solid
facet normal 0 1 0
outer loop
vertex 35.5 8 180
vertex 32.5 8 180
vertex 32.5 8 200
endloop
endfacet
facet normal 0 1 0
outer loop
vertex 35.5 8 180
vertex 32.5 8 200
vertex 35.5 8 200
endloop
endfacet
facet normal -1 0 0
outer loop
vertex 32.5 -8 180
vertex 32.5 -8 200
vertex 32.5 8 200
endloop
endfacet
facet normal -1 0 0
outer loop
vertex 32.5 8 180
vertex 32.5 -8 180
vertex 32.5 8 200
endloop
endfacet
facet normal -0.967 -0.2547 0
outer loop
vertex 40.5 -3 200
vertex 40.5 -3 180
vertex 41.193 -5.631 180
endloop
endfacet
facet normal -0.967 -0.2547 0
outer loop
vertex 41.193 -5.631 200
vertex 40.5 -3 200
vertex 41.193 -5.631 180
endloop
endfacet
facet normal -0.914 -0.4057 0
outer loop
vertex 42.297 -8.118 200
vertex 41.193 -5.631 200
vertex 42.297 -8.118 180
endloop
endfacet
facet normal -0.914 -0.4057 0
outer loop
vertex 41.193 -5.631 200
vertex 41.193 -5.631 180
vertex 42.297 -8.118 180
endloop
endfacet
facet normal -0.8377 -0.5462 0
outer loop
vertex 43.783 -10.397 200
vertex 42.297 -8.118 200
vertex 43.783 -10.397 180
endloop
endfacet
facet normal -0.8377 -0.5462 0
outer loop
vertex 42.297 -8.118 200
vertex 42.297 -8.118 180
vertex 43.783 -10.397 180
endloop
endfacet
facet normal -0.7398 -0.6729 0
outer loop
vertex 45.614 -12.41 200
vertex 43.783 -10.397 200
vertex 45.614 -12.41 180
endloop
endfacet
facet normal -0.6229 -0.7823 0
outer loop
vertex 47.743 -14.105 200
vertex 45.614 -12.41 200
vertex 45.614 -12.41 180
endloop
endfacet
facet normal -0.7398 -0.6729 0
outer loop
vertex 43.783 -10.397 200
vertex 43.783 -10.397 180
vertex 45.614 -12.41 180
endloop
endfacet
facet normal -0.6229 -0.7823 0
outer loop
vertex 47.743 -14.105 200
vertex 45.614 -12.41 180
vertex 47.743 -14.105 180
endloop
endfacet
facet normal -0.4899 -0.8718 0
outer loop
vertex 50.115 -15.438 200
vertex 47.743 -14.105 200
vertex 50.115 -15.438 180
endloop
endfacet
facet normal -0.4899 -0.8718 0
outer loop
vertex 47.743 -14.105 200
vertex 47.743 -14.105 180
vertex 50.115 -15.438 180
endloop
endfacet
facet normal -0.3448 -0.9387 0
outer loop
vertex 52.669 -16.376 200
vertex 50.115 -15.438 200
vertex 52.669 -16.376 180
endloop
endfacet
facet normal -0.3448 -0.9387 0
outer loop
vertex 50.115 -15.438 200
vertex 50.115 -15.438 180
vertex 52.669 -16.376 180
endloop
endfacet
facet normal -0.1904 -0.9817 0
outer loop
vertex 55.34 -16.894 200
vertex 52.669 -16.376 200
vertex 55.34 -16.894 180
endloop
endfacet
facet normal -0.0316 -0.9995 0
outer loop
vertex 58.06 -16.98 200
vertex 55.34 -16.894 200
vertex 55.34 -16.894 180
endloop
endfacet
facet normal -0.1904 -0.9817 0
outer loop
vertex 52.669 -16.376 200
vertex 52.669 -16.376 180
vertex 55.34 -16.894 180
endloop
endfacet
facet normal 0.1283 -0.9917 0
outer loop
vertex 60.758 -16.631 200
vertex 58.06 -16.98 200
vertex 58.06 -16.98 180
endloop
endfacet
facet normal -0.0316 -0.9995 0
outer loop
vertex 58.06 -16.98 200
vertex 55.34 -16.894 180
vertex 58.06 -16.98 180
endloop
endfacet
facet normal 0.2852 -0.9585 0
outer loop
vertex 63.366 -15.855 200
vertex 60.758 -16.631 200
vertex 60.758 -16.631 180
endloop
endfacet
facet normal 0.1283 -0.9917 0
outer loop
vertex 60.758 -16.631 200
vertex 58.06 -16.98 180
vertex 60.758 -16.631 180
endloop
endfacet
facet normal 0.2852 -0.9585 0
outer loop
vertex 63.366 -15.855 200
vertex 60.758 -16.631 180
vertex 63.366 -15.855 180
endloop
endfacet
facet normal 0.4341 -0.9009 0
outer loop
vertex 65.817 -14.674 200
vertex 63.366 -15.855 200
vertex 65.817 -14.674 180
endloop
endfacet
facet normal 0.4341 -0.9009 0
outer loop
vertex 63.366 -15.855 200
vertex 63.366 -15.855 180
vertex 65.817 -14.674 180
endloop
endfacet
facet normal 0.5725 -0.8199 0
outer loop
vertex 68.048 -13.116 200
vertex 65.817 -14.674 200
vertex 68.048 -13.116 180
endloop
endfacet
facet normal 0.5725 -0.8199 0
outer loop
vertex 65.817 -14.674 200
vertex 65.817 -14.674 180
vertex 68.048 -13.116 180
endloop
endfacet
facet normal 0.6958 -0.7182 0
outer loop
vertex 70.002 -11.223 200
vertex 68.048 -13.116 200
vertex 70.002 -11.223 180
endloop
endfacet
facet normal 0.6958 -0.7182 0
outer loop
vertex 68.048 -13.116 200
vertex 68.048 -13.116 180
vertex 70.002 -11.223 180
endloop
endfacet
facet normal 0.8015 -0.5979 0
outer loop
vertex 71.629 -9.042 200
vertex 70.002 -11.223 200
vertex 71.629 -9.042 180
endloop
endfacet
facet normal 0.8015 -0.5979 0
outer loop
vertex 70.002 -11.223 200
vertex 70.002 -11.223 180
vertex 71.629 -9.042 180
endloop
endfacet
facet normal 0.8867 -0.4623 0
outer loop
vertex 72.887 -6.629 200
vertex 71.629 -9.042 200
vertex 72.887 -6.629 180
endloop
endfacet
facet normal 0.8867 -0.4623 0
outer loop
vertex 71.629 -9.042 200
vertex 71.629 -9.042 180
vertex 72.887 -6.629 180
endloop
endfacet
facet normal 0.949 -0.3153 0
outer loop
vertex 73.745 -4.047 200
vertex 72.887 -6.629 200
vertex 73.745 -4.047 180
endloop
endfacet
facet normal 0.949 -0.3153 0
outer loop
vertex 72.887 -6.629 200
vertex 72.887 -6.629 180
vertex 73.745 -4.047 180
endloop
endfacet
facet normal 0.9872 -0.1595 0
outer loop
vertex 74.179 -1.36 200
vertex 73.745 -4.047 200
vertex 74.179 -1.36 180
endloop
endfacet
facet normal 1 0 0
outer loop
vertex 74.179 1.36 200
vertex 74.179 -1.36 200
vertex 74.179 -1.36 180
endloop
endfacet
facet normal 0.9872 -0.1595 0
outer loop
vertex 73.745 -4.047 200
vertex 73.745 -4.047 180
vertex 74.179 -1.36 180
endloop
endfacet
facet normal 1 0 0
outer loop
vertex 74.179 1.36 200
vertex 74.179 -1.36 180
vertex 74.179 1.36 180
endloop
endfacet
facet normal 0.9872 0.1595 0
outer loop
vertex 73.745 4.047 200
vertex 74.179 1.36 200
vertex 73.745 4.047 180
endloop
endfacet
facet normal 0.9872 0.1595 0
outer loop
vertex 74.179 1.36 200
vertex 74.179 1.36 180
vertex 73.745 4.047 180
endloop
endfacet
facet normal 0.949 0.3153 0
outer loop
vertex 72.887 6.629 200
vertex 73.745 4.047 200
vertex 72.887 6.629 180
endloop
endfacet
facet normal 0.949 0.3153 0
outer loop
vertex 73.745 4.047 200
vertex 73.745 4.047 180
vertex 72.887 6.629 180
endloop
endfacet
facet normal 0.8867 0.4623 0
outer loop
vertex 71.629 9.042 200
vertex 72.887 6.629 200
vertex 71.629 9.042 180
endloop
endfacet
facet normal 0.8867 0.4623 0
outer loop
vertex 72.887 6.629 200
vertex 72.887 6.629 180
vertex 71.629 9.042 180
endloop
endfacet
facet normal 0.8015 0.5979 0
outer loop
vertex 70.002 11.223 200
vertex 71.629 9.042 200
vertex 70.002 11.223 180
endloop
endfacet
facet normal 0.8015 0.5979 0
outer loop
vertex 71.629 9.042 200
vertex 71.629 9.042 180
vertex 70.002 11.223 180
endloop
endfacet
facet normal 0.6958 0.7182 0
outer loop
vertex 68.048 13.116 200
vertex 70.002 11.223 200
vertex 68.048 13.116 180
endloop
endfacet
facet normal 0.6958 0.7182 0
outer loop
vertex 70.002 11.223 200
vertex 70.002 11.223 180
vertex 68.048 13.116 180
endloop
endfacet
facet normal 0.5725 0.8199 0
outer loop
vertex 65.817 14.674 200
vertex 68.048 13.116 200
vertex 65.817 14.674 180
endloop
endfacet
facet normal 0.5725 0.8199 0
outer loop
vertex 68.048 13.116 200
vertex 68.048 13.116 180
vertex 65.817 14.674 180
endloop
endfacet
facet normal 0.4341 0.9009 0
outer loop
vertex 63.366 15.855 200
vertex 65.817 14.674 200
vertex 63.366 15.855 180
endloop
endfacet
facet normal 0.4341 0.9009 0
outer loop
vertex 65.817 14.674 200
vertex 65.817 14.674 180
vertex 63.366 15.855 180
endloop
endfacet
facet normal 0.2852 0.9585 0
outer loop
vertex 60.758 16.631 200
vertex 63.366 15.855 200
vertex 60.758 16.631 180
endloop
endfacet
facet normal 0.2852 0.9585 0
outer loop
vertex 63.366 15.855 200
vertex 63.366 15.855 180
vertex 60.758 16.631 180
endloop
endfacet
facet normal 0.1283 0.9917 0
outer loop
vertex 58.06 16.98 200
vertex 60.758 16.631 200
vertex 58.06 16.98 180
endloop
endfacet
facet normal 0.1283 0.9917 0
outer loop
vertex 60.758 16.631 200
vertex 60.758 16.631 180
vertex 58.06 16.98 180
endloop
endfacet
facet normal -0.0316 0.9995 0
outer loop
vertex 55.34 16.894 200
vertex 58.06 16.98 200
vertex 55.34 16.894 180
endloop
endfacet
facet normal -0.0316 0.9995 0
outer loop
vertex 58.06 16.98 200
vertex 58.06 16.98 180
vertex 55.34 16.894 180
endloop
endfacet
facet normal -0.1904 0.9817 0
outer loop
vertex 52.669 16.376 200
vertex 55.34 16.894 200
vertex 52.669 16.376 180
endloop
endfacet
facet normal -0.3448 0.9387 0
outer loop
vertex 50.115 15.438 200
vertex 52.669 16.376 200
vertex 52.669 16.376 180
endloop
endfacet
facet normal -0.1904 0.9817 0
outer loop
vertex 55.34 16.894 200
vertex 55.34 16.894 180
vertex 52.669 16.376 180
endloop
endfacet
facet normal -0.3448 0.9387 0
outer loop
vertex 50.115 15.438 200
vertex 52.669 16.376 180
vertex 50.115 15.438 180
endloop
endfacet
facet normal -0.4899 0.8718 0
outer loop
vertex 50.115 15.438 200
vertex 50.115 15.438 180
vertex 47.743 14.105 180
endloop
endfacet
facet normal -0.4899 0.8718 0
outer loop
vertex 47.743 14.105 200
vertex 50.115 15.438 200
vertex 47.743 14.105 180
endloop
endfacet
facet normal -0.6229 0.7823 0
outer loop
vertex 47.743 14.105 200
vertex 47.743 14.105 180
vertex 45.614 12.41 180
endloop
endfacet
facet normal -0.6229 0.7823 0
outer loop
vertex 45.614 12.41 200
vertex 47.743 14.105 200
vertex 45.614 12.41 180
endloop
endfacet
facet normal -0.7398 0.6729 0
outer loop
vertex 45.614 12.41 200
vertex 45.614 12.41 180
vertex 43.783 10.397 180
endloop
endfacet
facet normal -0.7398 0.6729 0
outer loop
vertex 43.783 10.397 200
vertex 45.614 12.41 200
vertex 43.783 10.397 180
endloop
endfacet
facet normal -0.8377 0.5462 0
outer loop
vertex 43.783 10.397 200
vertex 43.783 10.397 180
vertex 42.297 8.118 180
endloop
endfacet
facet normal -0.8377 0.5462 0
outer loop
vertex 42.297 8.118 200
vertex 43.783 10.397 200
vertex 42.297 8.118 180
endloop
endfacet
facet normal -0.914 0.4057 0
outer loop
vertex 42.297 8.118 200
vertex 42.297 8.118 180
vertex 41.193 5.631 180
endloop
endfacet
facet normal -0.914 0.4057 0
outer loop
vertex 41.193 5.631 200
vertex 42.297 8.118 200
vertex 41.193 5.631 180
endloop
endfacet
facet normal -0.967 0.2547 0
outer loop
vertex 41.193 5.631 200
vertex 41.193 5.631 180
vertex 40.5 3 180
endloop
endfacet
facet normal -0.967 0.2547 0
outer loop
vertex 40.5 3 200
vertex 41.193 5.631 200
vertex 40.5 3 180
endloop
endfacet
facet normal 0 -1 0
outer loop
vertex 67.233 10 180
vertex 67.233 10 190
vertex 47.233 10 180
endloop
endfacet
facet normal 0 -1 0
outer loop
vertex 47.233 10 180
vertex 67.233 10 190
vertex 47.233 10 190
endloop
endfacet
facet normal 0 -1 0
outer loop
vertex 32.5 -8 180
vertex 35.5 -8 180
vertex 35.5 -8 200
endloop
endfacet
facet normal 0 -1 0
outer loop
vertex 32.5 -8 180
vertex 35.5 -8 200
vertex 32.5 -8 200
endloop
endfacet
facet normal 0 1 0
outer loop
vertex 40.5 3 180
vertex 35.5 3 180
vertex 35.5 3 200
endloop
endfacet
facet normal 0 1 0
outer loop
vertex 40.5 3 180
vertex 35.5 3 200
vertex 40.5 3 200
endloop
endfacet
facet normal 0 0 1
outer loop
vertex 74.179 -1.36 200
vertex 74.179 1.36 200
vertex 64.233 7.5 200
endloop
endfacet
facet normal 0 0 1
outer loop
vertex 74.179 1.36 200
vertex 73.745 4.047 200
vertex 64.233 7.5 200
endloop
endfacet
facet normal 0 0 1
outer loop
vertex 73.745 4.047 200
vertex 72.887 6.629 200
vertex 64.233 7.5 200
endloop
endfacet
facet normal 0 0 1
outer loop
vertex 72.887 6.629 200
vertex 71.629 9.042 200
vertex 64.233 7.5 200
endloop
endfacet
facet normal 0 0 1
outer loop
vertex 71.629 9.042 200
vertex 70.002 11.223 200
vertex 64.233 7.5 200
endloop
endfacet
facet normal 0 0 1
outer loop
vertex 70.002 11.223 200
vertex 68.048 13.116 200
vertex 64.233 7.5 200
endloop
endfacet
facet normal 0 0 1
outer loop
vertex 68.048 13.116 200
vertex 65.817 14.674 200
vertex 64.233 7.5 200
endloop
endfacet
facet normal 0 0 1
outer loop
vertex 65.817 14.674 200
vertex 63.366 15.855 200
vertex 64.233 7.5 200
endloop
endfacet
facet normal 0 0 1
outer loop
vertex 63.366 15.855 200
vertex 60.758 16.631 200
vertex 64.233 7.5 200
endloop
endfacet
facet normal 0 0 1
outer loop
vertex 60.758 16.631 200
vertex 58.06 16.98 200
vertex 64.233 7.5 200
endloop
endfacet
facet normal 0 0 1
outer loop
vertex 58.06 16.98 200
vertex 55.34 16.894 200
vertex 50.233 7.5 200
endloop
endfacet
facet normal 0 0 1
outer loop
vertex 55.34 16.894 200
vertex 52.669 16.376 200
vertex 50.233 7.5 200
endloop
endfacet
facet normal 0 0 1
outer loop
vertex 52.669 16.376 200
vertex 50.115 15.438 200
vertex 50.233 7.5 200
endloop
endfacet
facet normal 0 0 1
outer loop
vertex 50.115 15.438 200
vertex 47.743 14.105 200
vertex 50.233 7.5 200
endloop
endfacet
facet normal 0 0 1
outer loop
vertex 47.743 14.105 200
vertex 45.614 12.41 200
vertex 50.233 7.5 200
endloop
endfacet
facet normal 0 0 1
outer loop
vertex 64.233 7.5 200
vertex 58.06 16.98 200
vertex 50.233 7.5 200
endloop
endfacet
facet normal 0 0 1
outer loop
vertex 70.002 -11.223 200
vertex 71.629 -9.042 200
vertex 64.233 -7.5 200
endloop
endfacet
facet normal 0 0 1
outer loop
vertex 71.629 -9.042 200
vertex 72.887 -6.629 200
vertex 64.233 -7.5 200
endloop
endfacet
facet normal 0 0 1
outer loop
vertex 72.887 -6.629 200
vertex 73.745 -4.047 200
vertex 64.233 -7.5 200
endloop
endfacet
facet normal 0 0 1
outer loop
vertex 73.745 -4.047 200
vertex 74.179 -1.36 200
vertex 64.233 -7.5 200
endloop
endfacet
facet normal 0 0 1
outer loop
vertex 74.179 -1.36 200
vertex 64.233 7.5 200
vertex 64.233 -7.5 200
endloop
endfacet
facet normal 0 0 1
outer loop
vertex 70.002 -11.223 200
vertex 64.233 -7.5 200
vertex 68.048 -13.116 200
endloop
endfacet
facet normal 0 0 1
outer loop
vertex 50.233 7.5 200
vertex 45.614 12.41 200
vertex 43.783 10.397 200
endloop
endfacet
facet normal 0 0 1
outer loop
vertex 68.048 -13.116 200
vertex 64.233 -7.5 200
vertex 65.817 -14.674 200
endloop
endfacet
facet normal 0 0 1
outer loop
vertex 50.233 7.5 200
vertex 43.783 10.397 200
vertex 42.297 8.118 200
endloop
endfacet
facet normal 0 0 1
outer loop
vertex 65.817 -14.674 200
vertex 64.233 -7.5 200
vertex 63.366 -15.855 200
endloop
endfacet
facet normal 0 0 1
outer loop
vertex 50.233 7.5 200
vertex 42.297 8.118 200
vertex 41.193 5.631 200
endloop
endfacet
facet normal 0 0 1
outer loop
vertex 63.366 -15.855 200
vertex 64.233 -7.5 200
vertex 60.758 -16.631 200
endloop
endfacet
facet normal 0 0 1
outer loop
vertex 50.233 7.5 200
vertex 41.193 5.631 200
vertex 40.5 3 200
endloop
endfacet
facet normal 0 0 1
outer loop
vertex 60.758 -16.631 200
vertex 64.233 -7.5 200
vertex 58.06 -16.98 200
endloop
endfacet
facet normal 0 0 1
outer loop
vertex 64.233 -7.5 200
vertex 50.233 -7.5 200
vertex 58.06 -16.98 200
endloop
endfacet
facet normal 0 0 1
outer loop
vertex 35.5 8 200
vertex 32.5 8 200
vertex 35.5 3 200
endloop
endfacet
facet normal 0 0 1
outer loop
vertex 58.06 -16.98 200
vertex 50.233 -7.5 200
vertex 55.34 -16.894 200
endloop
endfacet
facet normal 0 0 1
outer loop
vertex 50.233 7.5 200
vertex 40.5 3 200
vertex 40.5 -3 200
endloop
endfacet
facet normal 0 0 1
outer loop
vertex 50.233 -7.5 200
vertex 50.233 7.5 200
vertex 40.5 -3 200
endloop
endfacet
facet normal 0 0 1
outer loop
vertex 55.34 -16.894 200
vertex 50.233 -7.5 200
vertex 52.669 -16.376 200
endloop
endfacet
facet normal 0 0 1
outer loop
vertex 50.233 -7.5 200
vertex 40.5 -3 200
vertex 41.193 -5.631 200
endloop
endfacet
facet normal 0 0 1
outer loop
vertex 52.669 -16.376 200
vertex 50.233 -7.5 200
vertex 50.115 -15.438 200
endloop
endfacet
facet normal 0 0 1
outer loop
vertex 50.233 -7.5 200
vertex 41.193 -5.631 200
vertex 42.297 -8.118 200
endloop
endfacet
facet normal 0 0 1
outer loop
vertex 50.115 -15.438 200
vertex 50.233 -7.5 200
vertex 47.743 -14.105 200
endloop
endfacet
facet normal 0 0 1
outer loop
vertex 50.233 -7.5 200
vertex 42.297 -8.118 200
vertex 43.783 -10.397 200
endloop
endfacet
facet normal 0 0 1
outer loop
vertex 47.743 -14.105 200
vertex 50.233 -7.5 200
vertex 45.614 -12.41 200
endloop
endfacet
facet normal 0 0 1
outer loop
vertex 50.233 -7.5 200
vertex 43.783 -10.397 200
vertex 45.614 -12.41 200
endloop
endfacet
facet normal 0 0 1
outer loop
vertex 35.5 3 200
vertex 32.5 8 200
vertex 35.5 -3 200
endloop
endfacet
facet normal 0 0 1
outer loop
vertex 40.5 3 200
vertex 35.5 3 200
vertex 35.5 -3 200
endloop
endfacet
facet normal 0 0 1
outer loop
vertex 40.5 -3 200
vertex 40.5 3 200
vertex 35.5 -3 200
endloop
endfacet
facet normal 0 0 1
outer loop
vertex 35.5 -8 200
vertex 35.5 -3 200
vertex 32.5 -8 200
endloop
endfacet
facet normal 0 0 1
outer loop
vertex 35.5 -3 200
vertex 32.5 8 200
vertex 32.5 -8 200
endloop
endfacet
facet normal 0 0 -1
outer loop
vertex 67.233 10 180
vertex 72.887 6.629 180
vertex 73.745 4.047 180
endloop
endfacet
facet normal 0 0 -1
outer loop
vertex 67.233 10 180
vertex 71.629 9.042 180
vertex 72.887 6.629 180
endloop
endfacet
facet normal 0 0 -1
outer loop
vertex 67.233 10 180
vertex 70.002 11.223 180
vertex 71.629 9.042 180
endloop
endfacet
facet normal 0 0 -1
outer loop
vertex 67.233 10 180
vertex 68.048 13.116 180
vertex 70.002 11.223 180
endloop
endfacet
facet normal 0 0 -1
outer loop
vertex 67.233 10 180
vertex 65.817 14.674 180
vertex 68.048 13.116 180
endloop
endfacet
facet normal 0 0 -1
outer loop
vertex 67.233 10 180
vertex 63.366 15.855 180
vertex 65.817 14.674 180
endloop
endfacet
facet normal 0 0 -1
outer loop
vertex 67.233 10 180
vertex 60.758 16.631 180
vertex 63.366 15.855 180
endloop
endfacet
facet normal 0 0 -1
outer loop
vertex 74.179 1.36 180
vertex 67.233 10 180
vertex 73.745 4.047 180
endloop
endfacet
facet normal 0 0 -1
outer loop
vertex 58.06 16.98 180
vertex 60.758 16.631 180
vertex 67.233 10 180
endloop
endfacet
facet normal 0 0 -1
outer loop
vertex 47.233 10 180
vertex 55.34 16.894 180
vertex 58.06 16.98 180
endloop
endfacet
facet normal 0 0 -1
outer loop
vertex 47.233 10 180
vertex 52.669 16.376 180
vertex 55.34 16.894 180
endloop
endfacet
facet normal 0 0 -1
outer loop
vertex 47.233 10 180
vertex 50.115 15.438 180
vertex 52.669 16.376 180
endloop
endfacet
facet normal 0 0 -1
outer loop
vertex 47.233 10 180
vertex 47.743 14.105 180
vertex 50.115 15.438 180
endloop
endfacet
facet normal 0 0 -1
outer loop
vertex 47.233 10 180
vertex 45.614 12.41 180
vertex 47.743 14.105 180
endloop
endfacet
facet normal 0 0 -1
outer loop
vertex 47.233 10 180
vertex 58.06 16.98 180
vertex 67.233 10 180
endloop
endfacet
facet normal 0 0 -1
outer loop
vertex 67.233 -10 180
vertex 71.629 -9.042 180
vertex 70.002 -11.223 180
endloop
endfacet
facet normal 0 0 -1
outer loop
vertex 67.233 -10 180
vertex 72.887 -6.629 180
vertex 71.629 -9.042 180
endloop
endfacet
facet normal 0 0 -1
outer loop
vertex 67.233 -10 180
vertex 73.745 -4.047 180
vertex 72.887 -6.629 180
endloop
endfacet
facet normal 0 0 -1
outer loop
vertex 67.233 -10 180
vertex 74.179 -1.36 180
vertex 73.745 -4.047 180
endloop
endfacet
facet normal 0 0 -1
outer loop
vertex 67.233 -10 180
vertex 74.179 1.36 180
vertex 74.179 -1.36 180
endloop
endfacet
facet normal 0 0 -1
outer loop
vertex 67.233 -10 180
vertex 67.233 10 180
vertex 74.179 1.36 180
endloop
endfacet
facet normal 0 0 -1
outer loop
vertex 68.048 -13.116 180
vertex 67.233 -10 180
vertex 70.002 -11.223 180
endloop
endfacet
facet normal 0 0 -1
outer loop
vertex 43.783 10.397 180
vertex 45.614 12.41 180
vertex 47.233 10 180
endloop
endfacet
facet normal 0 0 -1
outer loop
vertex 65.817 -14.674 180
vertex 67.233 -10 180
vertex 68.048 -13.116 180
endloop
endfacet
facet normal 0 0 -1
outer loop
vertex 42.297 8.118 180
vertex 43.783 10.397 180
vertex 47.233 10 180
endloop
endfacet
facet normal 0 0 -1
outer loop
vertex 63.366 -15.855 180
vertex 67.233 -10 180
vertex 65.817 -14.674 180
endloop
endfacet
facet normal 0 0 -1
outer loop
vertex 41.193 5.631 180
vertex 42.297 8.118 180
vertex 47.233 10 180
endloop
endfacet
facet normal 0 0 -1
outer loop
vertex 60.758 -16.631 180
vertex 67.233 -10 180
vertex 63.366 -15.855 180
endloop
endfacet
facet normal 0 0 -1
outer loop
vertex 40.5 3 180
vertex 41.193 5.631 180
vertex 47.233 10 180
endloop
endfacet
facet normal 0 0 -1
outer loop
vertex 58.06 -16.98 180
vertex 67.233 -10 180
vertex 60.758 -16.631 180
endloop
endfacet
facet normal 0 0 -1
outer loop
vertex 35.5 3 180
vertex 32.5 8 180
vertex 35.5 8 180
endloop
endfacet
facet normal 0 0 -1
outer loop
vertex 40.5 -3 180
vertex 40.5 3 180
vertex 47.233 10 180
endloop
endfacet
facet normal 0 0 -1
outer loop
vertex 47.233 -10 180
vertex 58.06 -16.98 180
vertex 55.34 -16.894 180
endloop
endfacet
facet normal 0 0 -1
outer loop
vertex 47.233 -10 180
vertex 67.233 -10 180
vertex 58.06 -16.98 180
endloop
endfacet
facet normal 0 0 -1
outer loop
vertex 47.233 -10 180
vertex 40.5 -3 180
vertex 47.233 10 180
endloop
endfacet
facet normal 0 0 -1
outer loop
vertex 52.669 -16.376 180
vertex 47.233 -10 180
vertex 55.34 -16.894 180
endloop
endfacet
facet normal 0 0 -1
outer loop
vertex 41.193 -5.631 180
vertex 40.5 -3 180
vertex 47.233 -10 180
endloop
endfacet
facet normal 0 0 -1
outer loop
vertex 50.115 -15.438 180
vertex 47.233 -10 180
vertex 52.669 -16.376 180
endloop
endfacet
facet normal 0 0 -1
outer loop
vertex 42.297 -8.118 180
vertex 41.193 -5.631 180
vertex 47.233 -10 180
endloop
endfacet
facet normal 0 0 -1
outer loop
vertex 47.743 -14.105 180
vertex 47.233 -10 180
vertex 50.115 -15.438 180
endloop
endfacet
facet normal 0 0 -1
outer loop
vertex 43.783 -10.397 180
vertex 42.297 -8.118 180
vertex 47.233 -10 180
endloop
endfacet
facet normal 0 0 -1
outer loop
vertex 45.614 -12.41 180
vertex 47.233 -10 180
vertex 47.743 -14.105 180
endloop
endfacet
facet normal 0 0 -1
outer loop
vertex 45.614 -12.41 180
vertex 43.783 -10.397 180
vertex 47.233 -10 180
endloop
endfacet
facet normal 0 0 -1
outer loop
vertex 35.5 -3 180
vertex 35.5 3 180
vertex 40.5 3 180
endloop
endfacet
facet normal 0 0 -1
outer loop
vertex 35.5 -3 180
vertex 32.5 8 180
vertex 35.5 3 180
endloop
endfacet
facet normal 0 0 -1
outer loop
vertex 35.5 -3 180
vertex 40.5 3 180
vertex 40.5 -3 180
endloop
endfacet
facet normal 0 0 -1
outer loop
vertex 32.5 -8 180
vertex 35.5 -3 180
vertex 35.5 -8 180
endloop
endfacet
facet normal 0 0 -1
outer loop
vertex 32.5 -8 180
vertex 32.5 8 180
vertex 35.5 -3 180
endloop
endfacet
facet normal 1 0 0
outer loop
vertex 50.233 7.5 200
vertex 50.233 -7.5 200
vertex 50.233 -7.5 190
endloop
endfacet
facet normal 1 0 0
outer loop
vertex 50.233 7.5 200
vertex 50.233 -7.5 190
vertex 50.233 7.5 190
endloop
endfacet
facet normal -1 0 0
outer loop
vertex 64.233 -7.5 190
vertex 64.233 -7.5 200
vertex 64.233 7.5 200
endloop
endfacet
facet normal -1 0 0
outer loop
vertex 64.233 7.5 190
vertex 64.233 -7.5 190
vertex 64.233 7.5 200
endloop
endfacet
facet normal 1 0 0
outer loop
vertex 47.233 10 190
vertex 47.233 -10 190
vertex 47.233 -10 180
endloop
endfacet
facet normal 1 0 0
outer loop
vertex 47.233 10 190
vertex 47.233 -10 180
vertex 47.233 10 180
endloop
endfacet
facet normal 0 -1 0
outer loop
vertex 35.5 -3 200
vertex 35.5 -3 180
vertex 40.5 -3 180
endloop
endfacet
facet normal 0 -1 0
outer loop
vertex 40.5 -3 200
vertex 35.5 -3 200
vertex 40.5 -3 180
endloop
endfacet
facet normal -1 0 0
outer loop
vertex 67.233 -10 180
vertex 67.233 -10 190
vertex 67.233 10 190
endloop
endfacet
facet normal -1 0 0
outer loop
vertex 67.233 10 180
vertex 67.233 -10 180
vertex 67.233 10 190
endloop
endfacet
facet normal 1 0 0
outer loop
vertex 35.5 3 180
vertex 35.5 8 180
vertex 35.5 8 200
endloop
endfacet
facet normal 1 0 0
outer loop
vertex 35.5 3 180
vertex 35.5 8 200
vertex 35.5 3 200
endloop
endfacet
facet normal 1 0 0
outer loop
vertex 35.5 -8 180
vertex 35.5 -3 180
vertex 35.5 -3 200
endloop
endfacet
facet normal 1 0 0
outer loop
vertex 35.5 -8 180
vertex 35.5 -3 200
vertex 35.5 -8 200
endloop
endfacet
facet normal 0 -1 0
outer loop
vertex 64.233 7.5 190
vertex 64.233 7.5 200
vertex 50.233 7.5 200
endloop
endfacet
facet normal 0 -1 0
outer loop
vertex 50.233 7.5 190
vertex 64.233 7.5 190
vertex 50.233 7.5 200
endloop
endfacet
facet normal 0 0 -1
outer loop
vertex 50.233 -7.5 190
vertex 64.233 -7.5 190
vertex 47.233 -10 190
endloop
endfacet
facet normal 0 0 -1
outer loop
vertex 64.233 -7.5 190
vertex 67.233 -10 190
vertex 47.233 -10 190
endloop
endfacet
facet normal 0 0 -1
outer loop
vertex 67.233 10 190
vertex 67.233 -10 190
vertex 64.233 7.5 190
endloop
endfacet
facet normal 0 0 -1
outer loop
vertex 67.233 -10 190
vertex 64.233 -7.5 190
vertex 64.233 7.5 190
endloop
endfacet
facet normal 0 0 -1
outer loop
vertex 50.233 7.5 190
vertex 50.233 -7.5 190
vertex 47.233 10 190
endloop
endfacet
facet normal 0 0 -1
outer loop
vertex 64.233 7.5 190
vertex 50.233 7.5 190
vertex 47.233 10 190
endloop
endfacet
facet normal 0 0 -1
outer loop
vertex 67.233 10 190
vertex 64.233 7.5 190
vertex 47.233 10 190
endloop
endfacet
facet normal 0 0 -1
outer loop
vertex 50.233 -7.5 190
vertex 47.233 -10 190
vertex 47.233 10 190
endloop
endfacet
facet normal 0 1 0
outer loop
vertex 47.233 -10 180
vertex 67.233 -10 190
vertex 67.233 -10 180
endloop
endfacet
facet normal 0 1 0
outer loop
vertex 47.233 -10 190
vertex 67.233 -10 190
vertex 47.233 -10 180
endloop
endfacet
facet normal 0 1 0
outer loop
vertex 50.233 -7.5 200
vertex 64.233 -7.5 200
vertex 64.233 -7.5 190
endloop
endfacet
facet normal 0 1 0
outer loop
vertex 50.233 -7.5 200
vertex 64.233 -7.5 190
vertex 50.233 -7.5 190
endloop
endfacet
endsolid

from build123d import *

# Parameters (mm, degrees)
PAD007_DEPTH            = 20
SKETCH018_W             = 15
SKETCH018_H             = 14
POCKET008_DEPTH         = 20.001
SKETCH019_W             = 20
SKETCH019_H             = 20
POCKET009_DEPTH         = 10.001
BODY006_PLACEMENT_ANGLE = 90


with BuildPart() as part:
    # Sketch017 → Pad007 (new body)
    with BuildSketch(Plane.XY):
        with BuildLine():
            Line((-3, -3), (-8, -3))
            Line((-8, -3), (-8, 0))
            Line((-8, 0), (8, 0))
            Line((8, 0), (8, -3))
            Line((8, -3), (3, -3))
            Line((3, -3), (3, -8))
            ThreePointArc((-3, -8), (0, -41.733201), (3, -8))
            Line((-3, -3), (-3, -8))
        make_face()
    extrude(amount=PAD007_DEPTH)

    # Sketch018 (on Face10 of Pad007) → Pocket008 (cut, through all)
    with BuildSketch(Plane.XY.offset(20)):
        with Locations((0, -24.733201)):
            Rectangle(SKETCH018_W, SKETCH018_H)
    extrude(amount=-POCKET008_DEPTH, mode=Mode.SUBTRACT)

    # Sketch019 (on Face5 of Pocket008) → Pocket009 (cut, through all)
    with BuildSketch(Plane.XY.offset(10)):
        with Locations((0, -24.733201)):
            Rectangle(SKETCH019_W, SKETCH019_H)
    extrude(amount=-POCKET009_DEPTH, mode=Mode.SUBTRACT)


with BuildPart() as part_1:
    # Body006 placement: moved
    add(part.part.moved(Location((32.5, 0, 180))).rotate(Axis((32.5, 0, 180), (0, 0, 1)), BODY006_PLACEMENT_ANGLE))


solid = part_1.part
